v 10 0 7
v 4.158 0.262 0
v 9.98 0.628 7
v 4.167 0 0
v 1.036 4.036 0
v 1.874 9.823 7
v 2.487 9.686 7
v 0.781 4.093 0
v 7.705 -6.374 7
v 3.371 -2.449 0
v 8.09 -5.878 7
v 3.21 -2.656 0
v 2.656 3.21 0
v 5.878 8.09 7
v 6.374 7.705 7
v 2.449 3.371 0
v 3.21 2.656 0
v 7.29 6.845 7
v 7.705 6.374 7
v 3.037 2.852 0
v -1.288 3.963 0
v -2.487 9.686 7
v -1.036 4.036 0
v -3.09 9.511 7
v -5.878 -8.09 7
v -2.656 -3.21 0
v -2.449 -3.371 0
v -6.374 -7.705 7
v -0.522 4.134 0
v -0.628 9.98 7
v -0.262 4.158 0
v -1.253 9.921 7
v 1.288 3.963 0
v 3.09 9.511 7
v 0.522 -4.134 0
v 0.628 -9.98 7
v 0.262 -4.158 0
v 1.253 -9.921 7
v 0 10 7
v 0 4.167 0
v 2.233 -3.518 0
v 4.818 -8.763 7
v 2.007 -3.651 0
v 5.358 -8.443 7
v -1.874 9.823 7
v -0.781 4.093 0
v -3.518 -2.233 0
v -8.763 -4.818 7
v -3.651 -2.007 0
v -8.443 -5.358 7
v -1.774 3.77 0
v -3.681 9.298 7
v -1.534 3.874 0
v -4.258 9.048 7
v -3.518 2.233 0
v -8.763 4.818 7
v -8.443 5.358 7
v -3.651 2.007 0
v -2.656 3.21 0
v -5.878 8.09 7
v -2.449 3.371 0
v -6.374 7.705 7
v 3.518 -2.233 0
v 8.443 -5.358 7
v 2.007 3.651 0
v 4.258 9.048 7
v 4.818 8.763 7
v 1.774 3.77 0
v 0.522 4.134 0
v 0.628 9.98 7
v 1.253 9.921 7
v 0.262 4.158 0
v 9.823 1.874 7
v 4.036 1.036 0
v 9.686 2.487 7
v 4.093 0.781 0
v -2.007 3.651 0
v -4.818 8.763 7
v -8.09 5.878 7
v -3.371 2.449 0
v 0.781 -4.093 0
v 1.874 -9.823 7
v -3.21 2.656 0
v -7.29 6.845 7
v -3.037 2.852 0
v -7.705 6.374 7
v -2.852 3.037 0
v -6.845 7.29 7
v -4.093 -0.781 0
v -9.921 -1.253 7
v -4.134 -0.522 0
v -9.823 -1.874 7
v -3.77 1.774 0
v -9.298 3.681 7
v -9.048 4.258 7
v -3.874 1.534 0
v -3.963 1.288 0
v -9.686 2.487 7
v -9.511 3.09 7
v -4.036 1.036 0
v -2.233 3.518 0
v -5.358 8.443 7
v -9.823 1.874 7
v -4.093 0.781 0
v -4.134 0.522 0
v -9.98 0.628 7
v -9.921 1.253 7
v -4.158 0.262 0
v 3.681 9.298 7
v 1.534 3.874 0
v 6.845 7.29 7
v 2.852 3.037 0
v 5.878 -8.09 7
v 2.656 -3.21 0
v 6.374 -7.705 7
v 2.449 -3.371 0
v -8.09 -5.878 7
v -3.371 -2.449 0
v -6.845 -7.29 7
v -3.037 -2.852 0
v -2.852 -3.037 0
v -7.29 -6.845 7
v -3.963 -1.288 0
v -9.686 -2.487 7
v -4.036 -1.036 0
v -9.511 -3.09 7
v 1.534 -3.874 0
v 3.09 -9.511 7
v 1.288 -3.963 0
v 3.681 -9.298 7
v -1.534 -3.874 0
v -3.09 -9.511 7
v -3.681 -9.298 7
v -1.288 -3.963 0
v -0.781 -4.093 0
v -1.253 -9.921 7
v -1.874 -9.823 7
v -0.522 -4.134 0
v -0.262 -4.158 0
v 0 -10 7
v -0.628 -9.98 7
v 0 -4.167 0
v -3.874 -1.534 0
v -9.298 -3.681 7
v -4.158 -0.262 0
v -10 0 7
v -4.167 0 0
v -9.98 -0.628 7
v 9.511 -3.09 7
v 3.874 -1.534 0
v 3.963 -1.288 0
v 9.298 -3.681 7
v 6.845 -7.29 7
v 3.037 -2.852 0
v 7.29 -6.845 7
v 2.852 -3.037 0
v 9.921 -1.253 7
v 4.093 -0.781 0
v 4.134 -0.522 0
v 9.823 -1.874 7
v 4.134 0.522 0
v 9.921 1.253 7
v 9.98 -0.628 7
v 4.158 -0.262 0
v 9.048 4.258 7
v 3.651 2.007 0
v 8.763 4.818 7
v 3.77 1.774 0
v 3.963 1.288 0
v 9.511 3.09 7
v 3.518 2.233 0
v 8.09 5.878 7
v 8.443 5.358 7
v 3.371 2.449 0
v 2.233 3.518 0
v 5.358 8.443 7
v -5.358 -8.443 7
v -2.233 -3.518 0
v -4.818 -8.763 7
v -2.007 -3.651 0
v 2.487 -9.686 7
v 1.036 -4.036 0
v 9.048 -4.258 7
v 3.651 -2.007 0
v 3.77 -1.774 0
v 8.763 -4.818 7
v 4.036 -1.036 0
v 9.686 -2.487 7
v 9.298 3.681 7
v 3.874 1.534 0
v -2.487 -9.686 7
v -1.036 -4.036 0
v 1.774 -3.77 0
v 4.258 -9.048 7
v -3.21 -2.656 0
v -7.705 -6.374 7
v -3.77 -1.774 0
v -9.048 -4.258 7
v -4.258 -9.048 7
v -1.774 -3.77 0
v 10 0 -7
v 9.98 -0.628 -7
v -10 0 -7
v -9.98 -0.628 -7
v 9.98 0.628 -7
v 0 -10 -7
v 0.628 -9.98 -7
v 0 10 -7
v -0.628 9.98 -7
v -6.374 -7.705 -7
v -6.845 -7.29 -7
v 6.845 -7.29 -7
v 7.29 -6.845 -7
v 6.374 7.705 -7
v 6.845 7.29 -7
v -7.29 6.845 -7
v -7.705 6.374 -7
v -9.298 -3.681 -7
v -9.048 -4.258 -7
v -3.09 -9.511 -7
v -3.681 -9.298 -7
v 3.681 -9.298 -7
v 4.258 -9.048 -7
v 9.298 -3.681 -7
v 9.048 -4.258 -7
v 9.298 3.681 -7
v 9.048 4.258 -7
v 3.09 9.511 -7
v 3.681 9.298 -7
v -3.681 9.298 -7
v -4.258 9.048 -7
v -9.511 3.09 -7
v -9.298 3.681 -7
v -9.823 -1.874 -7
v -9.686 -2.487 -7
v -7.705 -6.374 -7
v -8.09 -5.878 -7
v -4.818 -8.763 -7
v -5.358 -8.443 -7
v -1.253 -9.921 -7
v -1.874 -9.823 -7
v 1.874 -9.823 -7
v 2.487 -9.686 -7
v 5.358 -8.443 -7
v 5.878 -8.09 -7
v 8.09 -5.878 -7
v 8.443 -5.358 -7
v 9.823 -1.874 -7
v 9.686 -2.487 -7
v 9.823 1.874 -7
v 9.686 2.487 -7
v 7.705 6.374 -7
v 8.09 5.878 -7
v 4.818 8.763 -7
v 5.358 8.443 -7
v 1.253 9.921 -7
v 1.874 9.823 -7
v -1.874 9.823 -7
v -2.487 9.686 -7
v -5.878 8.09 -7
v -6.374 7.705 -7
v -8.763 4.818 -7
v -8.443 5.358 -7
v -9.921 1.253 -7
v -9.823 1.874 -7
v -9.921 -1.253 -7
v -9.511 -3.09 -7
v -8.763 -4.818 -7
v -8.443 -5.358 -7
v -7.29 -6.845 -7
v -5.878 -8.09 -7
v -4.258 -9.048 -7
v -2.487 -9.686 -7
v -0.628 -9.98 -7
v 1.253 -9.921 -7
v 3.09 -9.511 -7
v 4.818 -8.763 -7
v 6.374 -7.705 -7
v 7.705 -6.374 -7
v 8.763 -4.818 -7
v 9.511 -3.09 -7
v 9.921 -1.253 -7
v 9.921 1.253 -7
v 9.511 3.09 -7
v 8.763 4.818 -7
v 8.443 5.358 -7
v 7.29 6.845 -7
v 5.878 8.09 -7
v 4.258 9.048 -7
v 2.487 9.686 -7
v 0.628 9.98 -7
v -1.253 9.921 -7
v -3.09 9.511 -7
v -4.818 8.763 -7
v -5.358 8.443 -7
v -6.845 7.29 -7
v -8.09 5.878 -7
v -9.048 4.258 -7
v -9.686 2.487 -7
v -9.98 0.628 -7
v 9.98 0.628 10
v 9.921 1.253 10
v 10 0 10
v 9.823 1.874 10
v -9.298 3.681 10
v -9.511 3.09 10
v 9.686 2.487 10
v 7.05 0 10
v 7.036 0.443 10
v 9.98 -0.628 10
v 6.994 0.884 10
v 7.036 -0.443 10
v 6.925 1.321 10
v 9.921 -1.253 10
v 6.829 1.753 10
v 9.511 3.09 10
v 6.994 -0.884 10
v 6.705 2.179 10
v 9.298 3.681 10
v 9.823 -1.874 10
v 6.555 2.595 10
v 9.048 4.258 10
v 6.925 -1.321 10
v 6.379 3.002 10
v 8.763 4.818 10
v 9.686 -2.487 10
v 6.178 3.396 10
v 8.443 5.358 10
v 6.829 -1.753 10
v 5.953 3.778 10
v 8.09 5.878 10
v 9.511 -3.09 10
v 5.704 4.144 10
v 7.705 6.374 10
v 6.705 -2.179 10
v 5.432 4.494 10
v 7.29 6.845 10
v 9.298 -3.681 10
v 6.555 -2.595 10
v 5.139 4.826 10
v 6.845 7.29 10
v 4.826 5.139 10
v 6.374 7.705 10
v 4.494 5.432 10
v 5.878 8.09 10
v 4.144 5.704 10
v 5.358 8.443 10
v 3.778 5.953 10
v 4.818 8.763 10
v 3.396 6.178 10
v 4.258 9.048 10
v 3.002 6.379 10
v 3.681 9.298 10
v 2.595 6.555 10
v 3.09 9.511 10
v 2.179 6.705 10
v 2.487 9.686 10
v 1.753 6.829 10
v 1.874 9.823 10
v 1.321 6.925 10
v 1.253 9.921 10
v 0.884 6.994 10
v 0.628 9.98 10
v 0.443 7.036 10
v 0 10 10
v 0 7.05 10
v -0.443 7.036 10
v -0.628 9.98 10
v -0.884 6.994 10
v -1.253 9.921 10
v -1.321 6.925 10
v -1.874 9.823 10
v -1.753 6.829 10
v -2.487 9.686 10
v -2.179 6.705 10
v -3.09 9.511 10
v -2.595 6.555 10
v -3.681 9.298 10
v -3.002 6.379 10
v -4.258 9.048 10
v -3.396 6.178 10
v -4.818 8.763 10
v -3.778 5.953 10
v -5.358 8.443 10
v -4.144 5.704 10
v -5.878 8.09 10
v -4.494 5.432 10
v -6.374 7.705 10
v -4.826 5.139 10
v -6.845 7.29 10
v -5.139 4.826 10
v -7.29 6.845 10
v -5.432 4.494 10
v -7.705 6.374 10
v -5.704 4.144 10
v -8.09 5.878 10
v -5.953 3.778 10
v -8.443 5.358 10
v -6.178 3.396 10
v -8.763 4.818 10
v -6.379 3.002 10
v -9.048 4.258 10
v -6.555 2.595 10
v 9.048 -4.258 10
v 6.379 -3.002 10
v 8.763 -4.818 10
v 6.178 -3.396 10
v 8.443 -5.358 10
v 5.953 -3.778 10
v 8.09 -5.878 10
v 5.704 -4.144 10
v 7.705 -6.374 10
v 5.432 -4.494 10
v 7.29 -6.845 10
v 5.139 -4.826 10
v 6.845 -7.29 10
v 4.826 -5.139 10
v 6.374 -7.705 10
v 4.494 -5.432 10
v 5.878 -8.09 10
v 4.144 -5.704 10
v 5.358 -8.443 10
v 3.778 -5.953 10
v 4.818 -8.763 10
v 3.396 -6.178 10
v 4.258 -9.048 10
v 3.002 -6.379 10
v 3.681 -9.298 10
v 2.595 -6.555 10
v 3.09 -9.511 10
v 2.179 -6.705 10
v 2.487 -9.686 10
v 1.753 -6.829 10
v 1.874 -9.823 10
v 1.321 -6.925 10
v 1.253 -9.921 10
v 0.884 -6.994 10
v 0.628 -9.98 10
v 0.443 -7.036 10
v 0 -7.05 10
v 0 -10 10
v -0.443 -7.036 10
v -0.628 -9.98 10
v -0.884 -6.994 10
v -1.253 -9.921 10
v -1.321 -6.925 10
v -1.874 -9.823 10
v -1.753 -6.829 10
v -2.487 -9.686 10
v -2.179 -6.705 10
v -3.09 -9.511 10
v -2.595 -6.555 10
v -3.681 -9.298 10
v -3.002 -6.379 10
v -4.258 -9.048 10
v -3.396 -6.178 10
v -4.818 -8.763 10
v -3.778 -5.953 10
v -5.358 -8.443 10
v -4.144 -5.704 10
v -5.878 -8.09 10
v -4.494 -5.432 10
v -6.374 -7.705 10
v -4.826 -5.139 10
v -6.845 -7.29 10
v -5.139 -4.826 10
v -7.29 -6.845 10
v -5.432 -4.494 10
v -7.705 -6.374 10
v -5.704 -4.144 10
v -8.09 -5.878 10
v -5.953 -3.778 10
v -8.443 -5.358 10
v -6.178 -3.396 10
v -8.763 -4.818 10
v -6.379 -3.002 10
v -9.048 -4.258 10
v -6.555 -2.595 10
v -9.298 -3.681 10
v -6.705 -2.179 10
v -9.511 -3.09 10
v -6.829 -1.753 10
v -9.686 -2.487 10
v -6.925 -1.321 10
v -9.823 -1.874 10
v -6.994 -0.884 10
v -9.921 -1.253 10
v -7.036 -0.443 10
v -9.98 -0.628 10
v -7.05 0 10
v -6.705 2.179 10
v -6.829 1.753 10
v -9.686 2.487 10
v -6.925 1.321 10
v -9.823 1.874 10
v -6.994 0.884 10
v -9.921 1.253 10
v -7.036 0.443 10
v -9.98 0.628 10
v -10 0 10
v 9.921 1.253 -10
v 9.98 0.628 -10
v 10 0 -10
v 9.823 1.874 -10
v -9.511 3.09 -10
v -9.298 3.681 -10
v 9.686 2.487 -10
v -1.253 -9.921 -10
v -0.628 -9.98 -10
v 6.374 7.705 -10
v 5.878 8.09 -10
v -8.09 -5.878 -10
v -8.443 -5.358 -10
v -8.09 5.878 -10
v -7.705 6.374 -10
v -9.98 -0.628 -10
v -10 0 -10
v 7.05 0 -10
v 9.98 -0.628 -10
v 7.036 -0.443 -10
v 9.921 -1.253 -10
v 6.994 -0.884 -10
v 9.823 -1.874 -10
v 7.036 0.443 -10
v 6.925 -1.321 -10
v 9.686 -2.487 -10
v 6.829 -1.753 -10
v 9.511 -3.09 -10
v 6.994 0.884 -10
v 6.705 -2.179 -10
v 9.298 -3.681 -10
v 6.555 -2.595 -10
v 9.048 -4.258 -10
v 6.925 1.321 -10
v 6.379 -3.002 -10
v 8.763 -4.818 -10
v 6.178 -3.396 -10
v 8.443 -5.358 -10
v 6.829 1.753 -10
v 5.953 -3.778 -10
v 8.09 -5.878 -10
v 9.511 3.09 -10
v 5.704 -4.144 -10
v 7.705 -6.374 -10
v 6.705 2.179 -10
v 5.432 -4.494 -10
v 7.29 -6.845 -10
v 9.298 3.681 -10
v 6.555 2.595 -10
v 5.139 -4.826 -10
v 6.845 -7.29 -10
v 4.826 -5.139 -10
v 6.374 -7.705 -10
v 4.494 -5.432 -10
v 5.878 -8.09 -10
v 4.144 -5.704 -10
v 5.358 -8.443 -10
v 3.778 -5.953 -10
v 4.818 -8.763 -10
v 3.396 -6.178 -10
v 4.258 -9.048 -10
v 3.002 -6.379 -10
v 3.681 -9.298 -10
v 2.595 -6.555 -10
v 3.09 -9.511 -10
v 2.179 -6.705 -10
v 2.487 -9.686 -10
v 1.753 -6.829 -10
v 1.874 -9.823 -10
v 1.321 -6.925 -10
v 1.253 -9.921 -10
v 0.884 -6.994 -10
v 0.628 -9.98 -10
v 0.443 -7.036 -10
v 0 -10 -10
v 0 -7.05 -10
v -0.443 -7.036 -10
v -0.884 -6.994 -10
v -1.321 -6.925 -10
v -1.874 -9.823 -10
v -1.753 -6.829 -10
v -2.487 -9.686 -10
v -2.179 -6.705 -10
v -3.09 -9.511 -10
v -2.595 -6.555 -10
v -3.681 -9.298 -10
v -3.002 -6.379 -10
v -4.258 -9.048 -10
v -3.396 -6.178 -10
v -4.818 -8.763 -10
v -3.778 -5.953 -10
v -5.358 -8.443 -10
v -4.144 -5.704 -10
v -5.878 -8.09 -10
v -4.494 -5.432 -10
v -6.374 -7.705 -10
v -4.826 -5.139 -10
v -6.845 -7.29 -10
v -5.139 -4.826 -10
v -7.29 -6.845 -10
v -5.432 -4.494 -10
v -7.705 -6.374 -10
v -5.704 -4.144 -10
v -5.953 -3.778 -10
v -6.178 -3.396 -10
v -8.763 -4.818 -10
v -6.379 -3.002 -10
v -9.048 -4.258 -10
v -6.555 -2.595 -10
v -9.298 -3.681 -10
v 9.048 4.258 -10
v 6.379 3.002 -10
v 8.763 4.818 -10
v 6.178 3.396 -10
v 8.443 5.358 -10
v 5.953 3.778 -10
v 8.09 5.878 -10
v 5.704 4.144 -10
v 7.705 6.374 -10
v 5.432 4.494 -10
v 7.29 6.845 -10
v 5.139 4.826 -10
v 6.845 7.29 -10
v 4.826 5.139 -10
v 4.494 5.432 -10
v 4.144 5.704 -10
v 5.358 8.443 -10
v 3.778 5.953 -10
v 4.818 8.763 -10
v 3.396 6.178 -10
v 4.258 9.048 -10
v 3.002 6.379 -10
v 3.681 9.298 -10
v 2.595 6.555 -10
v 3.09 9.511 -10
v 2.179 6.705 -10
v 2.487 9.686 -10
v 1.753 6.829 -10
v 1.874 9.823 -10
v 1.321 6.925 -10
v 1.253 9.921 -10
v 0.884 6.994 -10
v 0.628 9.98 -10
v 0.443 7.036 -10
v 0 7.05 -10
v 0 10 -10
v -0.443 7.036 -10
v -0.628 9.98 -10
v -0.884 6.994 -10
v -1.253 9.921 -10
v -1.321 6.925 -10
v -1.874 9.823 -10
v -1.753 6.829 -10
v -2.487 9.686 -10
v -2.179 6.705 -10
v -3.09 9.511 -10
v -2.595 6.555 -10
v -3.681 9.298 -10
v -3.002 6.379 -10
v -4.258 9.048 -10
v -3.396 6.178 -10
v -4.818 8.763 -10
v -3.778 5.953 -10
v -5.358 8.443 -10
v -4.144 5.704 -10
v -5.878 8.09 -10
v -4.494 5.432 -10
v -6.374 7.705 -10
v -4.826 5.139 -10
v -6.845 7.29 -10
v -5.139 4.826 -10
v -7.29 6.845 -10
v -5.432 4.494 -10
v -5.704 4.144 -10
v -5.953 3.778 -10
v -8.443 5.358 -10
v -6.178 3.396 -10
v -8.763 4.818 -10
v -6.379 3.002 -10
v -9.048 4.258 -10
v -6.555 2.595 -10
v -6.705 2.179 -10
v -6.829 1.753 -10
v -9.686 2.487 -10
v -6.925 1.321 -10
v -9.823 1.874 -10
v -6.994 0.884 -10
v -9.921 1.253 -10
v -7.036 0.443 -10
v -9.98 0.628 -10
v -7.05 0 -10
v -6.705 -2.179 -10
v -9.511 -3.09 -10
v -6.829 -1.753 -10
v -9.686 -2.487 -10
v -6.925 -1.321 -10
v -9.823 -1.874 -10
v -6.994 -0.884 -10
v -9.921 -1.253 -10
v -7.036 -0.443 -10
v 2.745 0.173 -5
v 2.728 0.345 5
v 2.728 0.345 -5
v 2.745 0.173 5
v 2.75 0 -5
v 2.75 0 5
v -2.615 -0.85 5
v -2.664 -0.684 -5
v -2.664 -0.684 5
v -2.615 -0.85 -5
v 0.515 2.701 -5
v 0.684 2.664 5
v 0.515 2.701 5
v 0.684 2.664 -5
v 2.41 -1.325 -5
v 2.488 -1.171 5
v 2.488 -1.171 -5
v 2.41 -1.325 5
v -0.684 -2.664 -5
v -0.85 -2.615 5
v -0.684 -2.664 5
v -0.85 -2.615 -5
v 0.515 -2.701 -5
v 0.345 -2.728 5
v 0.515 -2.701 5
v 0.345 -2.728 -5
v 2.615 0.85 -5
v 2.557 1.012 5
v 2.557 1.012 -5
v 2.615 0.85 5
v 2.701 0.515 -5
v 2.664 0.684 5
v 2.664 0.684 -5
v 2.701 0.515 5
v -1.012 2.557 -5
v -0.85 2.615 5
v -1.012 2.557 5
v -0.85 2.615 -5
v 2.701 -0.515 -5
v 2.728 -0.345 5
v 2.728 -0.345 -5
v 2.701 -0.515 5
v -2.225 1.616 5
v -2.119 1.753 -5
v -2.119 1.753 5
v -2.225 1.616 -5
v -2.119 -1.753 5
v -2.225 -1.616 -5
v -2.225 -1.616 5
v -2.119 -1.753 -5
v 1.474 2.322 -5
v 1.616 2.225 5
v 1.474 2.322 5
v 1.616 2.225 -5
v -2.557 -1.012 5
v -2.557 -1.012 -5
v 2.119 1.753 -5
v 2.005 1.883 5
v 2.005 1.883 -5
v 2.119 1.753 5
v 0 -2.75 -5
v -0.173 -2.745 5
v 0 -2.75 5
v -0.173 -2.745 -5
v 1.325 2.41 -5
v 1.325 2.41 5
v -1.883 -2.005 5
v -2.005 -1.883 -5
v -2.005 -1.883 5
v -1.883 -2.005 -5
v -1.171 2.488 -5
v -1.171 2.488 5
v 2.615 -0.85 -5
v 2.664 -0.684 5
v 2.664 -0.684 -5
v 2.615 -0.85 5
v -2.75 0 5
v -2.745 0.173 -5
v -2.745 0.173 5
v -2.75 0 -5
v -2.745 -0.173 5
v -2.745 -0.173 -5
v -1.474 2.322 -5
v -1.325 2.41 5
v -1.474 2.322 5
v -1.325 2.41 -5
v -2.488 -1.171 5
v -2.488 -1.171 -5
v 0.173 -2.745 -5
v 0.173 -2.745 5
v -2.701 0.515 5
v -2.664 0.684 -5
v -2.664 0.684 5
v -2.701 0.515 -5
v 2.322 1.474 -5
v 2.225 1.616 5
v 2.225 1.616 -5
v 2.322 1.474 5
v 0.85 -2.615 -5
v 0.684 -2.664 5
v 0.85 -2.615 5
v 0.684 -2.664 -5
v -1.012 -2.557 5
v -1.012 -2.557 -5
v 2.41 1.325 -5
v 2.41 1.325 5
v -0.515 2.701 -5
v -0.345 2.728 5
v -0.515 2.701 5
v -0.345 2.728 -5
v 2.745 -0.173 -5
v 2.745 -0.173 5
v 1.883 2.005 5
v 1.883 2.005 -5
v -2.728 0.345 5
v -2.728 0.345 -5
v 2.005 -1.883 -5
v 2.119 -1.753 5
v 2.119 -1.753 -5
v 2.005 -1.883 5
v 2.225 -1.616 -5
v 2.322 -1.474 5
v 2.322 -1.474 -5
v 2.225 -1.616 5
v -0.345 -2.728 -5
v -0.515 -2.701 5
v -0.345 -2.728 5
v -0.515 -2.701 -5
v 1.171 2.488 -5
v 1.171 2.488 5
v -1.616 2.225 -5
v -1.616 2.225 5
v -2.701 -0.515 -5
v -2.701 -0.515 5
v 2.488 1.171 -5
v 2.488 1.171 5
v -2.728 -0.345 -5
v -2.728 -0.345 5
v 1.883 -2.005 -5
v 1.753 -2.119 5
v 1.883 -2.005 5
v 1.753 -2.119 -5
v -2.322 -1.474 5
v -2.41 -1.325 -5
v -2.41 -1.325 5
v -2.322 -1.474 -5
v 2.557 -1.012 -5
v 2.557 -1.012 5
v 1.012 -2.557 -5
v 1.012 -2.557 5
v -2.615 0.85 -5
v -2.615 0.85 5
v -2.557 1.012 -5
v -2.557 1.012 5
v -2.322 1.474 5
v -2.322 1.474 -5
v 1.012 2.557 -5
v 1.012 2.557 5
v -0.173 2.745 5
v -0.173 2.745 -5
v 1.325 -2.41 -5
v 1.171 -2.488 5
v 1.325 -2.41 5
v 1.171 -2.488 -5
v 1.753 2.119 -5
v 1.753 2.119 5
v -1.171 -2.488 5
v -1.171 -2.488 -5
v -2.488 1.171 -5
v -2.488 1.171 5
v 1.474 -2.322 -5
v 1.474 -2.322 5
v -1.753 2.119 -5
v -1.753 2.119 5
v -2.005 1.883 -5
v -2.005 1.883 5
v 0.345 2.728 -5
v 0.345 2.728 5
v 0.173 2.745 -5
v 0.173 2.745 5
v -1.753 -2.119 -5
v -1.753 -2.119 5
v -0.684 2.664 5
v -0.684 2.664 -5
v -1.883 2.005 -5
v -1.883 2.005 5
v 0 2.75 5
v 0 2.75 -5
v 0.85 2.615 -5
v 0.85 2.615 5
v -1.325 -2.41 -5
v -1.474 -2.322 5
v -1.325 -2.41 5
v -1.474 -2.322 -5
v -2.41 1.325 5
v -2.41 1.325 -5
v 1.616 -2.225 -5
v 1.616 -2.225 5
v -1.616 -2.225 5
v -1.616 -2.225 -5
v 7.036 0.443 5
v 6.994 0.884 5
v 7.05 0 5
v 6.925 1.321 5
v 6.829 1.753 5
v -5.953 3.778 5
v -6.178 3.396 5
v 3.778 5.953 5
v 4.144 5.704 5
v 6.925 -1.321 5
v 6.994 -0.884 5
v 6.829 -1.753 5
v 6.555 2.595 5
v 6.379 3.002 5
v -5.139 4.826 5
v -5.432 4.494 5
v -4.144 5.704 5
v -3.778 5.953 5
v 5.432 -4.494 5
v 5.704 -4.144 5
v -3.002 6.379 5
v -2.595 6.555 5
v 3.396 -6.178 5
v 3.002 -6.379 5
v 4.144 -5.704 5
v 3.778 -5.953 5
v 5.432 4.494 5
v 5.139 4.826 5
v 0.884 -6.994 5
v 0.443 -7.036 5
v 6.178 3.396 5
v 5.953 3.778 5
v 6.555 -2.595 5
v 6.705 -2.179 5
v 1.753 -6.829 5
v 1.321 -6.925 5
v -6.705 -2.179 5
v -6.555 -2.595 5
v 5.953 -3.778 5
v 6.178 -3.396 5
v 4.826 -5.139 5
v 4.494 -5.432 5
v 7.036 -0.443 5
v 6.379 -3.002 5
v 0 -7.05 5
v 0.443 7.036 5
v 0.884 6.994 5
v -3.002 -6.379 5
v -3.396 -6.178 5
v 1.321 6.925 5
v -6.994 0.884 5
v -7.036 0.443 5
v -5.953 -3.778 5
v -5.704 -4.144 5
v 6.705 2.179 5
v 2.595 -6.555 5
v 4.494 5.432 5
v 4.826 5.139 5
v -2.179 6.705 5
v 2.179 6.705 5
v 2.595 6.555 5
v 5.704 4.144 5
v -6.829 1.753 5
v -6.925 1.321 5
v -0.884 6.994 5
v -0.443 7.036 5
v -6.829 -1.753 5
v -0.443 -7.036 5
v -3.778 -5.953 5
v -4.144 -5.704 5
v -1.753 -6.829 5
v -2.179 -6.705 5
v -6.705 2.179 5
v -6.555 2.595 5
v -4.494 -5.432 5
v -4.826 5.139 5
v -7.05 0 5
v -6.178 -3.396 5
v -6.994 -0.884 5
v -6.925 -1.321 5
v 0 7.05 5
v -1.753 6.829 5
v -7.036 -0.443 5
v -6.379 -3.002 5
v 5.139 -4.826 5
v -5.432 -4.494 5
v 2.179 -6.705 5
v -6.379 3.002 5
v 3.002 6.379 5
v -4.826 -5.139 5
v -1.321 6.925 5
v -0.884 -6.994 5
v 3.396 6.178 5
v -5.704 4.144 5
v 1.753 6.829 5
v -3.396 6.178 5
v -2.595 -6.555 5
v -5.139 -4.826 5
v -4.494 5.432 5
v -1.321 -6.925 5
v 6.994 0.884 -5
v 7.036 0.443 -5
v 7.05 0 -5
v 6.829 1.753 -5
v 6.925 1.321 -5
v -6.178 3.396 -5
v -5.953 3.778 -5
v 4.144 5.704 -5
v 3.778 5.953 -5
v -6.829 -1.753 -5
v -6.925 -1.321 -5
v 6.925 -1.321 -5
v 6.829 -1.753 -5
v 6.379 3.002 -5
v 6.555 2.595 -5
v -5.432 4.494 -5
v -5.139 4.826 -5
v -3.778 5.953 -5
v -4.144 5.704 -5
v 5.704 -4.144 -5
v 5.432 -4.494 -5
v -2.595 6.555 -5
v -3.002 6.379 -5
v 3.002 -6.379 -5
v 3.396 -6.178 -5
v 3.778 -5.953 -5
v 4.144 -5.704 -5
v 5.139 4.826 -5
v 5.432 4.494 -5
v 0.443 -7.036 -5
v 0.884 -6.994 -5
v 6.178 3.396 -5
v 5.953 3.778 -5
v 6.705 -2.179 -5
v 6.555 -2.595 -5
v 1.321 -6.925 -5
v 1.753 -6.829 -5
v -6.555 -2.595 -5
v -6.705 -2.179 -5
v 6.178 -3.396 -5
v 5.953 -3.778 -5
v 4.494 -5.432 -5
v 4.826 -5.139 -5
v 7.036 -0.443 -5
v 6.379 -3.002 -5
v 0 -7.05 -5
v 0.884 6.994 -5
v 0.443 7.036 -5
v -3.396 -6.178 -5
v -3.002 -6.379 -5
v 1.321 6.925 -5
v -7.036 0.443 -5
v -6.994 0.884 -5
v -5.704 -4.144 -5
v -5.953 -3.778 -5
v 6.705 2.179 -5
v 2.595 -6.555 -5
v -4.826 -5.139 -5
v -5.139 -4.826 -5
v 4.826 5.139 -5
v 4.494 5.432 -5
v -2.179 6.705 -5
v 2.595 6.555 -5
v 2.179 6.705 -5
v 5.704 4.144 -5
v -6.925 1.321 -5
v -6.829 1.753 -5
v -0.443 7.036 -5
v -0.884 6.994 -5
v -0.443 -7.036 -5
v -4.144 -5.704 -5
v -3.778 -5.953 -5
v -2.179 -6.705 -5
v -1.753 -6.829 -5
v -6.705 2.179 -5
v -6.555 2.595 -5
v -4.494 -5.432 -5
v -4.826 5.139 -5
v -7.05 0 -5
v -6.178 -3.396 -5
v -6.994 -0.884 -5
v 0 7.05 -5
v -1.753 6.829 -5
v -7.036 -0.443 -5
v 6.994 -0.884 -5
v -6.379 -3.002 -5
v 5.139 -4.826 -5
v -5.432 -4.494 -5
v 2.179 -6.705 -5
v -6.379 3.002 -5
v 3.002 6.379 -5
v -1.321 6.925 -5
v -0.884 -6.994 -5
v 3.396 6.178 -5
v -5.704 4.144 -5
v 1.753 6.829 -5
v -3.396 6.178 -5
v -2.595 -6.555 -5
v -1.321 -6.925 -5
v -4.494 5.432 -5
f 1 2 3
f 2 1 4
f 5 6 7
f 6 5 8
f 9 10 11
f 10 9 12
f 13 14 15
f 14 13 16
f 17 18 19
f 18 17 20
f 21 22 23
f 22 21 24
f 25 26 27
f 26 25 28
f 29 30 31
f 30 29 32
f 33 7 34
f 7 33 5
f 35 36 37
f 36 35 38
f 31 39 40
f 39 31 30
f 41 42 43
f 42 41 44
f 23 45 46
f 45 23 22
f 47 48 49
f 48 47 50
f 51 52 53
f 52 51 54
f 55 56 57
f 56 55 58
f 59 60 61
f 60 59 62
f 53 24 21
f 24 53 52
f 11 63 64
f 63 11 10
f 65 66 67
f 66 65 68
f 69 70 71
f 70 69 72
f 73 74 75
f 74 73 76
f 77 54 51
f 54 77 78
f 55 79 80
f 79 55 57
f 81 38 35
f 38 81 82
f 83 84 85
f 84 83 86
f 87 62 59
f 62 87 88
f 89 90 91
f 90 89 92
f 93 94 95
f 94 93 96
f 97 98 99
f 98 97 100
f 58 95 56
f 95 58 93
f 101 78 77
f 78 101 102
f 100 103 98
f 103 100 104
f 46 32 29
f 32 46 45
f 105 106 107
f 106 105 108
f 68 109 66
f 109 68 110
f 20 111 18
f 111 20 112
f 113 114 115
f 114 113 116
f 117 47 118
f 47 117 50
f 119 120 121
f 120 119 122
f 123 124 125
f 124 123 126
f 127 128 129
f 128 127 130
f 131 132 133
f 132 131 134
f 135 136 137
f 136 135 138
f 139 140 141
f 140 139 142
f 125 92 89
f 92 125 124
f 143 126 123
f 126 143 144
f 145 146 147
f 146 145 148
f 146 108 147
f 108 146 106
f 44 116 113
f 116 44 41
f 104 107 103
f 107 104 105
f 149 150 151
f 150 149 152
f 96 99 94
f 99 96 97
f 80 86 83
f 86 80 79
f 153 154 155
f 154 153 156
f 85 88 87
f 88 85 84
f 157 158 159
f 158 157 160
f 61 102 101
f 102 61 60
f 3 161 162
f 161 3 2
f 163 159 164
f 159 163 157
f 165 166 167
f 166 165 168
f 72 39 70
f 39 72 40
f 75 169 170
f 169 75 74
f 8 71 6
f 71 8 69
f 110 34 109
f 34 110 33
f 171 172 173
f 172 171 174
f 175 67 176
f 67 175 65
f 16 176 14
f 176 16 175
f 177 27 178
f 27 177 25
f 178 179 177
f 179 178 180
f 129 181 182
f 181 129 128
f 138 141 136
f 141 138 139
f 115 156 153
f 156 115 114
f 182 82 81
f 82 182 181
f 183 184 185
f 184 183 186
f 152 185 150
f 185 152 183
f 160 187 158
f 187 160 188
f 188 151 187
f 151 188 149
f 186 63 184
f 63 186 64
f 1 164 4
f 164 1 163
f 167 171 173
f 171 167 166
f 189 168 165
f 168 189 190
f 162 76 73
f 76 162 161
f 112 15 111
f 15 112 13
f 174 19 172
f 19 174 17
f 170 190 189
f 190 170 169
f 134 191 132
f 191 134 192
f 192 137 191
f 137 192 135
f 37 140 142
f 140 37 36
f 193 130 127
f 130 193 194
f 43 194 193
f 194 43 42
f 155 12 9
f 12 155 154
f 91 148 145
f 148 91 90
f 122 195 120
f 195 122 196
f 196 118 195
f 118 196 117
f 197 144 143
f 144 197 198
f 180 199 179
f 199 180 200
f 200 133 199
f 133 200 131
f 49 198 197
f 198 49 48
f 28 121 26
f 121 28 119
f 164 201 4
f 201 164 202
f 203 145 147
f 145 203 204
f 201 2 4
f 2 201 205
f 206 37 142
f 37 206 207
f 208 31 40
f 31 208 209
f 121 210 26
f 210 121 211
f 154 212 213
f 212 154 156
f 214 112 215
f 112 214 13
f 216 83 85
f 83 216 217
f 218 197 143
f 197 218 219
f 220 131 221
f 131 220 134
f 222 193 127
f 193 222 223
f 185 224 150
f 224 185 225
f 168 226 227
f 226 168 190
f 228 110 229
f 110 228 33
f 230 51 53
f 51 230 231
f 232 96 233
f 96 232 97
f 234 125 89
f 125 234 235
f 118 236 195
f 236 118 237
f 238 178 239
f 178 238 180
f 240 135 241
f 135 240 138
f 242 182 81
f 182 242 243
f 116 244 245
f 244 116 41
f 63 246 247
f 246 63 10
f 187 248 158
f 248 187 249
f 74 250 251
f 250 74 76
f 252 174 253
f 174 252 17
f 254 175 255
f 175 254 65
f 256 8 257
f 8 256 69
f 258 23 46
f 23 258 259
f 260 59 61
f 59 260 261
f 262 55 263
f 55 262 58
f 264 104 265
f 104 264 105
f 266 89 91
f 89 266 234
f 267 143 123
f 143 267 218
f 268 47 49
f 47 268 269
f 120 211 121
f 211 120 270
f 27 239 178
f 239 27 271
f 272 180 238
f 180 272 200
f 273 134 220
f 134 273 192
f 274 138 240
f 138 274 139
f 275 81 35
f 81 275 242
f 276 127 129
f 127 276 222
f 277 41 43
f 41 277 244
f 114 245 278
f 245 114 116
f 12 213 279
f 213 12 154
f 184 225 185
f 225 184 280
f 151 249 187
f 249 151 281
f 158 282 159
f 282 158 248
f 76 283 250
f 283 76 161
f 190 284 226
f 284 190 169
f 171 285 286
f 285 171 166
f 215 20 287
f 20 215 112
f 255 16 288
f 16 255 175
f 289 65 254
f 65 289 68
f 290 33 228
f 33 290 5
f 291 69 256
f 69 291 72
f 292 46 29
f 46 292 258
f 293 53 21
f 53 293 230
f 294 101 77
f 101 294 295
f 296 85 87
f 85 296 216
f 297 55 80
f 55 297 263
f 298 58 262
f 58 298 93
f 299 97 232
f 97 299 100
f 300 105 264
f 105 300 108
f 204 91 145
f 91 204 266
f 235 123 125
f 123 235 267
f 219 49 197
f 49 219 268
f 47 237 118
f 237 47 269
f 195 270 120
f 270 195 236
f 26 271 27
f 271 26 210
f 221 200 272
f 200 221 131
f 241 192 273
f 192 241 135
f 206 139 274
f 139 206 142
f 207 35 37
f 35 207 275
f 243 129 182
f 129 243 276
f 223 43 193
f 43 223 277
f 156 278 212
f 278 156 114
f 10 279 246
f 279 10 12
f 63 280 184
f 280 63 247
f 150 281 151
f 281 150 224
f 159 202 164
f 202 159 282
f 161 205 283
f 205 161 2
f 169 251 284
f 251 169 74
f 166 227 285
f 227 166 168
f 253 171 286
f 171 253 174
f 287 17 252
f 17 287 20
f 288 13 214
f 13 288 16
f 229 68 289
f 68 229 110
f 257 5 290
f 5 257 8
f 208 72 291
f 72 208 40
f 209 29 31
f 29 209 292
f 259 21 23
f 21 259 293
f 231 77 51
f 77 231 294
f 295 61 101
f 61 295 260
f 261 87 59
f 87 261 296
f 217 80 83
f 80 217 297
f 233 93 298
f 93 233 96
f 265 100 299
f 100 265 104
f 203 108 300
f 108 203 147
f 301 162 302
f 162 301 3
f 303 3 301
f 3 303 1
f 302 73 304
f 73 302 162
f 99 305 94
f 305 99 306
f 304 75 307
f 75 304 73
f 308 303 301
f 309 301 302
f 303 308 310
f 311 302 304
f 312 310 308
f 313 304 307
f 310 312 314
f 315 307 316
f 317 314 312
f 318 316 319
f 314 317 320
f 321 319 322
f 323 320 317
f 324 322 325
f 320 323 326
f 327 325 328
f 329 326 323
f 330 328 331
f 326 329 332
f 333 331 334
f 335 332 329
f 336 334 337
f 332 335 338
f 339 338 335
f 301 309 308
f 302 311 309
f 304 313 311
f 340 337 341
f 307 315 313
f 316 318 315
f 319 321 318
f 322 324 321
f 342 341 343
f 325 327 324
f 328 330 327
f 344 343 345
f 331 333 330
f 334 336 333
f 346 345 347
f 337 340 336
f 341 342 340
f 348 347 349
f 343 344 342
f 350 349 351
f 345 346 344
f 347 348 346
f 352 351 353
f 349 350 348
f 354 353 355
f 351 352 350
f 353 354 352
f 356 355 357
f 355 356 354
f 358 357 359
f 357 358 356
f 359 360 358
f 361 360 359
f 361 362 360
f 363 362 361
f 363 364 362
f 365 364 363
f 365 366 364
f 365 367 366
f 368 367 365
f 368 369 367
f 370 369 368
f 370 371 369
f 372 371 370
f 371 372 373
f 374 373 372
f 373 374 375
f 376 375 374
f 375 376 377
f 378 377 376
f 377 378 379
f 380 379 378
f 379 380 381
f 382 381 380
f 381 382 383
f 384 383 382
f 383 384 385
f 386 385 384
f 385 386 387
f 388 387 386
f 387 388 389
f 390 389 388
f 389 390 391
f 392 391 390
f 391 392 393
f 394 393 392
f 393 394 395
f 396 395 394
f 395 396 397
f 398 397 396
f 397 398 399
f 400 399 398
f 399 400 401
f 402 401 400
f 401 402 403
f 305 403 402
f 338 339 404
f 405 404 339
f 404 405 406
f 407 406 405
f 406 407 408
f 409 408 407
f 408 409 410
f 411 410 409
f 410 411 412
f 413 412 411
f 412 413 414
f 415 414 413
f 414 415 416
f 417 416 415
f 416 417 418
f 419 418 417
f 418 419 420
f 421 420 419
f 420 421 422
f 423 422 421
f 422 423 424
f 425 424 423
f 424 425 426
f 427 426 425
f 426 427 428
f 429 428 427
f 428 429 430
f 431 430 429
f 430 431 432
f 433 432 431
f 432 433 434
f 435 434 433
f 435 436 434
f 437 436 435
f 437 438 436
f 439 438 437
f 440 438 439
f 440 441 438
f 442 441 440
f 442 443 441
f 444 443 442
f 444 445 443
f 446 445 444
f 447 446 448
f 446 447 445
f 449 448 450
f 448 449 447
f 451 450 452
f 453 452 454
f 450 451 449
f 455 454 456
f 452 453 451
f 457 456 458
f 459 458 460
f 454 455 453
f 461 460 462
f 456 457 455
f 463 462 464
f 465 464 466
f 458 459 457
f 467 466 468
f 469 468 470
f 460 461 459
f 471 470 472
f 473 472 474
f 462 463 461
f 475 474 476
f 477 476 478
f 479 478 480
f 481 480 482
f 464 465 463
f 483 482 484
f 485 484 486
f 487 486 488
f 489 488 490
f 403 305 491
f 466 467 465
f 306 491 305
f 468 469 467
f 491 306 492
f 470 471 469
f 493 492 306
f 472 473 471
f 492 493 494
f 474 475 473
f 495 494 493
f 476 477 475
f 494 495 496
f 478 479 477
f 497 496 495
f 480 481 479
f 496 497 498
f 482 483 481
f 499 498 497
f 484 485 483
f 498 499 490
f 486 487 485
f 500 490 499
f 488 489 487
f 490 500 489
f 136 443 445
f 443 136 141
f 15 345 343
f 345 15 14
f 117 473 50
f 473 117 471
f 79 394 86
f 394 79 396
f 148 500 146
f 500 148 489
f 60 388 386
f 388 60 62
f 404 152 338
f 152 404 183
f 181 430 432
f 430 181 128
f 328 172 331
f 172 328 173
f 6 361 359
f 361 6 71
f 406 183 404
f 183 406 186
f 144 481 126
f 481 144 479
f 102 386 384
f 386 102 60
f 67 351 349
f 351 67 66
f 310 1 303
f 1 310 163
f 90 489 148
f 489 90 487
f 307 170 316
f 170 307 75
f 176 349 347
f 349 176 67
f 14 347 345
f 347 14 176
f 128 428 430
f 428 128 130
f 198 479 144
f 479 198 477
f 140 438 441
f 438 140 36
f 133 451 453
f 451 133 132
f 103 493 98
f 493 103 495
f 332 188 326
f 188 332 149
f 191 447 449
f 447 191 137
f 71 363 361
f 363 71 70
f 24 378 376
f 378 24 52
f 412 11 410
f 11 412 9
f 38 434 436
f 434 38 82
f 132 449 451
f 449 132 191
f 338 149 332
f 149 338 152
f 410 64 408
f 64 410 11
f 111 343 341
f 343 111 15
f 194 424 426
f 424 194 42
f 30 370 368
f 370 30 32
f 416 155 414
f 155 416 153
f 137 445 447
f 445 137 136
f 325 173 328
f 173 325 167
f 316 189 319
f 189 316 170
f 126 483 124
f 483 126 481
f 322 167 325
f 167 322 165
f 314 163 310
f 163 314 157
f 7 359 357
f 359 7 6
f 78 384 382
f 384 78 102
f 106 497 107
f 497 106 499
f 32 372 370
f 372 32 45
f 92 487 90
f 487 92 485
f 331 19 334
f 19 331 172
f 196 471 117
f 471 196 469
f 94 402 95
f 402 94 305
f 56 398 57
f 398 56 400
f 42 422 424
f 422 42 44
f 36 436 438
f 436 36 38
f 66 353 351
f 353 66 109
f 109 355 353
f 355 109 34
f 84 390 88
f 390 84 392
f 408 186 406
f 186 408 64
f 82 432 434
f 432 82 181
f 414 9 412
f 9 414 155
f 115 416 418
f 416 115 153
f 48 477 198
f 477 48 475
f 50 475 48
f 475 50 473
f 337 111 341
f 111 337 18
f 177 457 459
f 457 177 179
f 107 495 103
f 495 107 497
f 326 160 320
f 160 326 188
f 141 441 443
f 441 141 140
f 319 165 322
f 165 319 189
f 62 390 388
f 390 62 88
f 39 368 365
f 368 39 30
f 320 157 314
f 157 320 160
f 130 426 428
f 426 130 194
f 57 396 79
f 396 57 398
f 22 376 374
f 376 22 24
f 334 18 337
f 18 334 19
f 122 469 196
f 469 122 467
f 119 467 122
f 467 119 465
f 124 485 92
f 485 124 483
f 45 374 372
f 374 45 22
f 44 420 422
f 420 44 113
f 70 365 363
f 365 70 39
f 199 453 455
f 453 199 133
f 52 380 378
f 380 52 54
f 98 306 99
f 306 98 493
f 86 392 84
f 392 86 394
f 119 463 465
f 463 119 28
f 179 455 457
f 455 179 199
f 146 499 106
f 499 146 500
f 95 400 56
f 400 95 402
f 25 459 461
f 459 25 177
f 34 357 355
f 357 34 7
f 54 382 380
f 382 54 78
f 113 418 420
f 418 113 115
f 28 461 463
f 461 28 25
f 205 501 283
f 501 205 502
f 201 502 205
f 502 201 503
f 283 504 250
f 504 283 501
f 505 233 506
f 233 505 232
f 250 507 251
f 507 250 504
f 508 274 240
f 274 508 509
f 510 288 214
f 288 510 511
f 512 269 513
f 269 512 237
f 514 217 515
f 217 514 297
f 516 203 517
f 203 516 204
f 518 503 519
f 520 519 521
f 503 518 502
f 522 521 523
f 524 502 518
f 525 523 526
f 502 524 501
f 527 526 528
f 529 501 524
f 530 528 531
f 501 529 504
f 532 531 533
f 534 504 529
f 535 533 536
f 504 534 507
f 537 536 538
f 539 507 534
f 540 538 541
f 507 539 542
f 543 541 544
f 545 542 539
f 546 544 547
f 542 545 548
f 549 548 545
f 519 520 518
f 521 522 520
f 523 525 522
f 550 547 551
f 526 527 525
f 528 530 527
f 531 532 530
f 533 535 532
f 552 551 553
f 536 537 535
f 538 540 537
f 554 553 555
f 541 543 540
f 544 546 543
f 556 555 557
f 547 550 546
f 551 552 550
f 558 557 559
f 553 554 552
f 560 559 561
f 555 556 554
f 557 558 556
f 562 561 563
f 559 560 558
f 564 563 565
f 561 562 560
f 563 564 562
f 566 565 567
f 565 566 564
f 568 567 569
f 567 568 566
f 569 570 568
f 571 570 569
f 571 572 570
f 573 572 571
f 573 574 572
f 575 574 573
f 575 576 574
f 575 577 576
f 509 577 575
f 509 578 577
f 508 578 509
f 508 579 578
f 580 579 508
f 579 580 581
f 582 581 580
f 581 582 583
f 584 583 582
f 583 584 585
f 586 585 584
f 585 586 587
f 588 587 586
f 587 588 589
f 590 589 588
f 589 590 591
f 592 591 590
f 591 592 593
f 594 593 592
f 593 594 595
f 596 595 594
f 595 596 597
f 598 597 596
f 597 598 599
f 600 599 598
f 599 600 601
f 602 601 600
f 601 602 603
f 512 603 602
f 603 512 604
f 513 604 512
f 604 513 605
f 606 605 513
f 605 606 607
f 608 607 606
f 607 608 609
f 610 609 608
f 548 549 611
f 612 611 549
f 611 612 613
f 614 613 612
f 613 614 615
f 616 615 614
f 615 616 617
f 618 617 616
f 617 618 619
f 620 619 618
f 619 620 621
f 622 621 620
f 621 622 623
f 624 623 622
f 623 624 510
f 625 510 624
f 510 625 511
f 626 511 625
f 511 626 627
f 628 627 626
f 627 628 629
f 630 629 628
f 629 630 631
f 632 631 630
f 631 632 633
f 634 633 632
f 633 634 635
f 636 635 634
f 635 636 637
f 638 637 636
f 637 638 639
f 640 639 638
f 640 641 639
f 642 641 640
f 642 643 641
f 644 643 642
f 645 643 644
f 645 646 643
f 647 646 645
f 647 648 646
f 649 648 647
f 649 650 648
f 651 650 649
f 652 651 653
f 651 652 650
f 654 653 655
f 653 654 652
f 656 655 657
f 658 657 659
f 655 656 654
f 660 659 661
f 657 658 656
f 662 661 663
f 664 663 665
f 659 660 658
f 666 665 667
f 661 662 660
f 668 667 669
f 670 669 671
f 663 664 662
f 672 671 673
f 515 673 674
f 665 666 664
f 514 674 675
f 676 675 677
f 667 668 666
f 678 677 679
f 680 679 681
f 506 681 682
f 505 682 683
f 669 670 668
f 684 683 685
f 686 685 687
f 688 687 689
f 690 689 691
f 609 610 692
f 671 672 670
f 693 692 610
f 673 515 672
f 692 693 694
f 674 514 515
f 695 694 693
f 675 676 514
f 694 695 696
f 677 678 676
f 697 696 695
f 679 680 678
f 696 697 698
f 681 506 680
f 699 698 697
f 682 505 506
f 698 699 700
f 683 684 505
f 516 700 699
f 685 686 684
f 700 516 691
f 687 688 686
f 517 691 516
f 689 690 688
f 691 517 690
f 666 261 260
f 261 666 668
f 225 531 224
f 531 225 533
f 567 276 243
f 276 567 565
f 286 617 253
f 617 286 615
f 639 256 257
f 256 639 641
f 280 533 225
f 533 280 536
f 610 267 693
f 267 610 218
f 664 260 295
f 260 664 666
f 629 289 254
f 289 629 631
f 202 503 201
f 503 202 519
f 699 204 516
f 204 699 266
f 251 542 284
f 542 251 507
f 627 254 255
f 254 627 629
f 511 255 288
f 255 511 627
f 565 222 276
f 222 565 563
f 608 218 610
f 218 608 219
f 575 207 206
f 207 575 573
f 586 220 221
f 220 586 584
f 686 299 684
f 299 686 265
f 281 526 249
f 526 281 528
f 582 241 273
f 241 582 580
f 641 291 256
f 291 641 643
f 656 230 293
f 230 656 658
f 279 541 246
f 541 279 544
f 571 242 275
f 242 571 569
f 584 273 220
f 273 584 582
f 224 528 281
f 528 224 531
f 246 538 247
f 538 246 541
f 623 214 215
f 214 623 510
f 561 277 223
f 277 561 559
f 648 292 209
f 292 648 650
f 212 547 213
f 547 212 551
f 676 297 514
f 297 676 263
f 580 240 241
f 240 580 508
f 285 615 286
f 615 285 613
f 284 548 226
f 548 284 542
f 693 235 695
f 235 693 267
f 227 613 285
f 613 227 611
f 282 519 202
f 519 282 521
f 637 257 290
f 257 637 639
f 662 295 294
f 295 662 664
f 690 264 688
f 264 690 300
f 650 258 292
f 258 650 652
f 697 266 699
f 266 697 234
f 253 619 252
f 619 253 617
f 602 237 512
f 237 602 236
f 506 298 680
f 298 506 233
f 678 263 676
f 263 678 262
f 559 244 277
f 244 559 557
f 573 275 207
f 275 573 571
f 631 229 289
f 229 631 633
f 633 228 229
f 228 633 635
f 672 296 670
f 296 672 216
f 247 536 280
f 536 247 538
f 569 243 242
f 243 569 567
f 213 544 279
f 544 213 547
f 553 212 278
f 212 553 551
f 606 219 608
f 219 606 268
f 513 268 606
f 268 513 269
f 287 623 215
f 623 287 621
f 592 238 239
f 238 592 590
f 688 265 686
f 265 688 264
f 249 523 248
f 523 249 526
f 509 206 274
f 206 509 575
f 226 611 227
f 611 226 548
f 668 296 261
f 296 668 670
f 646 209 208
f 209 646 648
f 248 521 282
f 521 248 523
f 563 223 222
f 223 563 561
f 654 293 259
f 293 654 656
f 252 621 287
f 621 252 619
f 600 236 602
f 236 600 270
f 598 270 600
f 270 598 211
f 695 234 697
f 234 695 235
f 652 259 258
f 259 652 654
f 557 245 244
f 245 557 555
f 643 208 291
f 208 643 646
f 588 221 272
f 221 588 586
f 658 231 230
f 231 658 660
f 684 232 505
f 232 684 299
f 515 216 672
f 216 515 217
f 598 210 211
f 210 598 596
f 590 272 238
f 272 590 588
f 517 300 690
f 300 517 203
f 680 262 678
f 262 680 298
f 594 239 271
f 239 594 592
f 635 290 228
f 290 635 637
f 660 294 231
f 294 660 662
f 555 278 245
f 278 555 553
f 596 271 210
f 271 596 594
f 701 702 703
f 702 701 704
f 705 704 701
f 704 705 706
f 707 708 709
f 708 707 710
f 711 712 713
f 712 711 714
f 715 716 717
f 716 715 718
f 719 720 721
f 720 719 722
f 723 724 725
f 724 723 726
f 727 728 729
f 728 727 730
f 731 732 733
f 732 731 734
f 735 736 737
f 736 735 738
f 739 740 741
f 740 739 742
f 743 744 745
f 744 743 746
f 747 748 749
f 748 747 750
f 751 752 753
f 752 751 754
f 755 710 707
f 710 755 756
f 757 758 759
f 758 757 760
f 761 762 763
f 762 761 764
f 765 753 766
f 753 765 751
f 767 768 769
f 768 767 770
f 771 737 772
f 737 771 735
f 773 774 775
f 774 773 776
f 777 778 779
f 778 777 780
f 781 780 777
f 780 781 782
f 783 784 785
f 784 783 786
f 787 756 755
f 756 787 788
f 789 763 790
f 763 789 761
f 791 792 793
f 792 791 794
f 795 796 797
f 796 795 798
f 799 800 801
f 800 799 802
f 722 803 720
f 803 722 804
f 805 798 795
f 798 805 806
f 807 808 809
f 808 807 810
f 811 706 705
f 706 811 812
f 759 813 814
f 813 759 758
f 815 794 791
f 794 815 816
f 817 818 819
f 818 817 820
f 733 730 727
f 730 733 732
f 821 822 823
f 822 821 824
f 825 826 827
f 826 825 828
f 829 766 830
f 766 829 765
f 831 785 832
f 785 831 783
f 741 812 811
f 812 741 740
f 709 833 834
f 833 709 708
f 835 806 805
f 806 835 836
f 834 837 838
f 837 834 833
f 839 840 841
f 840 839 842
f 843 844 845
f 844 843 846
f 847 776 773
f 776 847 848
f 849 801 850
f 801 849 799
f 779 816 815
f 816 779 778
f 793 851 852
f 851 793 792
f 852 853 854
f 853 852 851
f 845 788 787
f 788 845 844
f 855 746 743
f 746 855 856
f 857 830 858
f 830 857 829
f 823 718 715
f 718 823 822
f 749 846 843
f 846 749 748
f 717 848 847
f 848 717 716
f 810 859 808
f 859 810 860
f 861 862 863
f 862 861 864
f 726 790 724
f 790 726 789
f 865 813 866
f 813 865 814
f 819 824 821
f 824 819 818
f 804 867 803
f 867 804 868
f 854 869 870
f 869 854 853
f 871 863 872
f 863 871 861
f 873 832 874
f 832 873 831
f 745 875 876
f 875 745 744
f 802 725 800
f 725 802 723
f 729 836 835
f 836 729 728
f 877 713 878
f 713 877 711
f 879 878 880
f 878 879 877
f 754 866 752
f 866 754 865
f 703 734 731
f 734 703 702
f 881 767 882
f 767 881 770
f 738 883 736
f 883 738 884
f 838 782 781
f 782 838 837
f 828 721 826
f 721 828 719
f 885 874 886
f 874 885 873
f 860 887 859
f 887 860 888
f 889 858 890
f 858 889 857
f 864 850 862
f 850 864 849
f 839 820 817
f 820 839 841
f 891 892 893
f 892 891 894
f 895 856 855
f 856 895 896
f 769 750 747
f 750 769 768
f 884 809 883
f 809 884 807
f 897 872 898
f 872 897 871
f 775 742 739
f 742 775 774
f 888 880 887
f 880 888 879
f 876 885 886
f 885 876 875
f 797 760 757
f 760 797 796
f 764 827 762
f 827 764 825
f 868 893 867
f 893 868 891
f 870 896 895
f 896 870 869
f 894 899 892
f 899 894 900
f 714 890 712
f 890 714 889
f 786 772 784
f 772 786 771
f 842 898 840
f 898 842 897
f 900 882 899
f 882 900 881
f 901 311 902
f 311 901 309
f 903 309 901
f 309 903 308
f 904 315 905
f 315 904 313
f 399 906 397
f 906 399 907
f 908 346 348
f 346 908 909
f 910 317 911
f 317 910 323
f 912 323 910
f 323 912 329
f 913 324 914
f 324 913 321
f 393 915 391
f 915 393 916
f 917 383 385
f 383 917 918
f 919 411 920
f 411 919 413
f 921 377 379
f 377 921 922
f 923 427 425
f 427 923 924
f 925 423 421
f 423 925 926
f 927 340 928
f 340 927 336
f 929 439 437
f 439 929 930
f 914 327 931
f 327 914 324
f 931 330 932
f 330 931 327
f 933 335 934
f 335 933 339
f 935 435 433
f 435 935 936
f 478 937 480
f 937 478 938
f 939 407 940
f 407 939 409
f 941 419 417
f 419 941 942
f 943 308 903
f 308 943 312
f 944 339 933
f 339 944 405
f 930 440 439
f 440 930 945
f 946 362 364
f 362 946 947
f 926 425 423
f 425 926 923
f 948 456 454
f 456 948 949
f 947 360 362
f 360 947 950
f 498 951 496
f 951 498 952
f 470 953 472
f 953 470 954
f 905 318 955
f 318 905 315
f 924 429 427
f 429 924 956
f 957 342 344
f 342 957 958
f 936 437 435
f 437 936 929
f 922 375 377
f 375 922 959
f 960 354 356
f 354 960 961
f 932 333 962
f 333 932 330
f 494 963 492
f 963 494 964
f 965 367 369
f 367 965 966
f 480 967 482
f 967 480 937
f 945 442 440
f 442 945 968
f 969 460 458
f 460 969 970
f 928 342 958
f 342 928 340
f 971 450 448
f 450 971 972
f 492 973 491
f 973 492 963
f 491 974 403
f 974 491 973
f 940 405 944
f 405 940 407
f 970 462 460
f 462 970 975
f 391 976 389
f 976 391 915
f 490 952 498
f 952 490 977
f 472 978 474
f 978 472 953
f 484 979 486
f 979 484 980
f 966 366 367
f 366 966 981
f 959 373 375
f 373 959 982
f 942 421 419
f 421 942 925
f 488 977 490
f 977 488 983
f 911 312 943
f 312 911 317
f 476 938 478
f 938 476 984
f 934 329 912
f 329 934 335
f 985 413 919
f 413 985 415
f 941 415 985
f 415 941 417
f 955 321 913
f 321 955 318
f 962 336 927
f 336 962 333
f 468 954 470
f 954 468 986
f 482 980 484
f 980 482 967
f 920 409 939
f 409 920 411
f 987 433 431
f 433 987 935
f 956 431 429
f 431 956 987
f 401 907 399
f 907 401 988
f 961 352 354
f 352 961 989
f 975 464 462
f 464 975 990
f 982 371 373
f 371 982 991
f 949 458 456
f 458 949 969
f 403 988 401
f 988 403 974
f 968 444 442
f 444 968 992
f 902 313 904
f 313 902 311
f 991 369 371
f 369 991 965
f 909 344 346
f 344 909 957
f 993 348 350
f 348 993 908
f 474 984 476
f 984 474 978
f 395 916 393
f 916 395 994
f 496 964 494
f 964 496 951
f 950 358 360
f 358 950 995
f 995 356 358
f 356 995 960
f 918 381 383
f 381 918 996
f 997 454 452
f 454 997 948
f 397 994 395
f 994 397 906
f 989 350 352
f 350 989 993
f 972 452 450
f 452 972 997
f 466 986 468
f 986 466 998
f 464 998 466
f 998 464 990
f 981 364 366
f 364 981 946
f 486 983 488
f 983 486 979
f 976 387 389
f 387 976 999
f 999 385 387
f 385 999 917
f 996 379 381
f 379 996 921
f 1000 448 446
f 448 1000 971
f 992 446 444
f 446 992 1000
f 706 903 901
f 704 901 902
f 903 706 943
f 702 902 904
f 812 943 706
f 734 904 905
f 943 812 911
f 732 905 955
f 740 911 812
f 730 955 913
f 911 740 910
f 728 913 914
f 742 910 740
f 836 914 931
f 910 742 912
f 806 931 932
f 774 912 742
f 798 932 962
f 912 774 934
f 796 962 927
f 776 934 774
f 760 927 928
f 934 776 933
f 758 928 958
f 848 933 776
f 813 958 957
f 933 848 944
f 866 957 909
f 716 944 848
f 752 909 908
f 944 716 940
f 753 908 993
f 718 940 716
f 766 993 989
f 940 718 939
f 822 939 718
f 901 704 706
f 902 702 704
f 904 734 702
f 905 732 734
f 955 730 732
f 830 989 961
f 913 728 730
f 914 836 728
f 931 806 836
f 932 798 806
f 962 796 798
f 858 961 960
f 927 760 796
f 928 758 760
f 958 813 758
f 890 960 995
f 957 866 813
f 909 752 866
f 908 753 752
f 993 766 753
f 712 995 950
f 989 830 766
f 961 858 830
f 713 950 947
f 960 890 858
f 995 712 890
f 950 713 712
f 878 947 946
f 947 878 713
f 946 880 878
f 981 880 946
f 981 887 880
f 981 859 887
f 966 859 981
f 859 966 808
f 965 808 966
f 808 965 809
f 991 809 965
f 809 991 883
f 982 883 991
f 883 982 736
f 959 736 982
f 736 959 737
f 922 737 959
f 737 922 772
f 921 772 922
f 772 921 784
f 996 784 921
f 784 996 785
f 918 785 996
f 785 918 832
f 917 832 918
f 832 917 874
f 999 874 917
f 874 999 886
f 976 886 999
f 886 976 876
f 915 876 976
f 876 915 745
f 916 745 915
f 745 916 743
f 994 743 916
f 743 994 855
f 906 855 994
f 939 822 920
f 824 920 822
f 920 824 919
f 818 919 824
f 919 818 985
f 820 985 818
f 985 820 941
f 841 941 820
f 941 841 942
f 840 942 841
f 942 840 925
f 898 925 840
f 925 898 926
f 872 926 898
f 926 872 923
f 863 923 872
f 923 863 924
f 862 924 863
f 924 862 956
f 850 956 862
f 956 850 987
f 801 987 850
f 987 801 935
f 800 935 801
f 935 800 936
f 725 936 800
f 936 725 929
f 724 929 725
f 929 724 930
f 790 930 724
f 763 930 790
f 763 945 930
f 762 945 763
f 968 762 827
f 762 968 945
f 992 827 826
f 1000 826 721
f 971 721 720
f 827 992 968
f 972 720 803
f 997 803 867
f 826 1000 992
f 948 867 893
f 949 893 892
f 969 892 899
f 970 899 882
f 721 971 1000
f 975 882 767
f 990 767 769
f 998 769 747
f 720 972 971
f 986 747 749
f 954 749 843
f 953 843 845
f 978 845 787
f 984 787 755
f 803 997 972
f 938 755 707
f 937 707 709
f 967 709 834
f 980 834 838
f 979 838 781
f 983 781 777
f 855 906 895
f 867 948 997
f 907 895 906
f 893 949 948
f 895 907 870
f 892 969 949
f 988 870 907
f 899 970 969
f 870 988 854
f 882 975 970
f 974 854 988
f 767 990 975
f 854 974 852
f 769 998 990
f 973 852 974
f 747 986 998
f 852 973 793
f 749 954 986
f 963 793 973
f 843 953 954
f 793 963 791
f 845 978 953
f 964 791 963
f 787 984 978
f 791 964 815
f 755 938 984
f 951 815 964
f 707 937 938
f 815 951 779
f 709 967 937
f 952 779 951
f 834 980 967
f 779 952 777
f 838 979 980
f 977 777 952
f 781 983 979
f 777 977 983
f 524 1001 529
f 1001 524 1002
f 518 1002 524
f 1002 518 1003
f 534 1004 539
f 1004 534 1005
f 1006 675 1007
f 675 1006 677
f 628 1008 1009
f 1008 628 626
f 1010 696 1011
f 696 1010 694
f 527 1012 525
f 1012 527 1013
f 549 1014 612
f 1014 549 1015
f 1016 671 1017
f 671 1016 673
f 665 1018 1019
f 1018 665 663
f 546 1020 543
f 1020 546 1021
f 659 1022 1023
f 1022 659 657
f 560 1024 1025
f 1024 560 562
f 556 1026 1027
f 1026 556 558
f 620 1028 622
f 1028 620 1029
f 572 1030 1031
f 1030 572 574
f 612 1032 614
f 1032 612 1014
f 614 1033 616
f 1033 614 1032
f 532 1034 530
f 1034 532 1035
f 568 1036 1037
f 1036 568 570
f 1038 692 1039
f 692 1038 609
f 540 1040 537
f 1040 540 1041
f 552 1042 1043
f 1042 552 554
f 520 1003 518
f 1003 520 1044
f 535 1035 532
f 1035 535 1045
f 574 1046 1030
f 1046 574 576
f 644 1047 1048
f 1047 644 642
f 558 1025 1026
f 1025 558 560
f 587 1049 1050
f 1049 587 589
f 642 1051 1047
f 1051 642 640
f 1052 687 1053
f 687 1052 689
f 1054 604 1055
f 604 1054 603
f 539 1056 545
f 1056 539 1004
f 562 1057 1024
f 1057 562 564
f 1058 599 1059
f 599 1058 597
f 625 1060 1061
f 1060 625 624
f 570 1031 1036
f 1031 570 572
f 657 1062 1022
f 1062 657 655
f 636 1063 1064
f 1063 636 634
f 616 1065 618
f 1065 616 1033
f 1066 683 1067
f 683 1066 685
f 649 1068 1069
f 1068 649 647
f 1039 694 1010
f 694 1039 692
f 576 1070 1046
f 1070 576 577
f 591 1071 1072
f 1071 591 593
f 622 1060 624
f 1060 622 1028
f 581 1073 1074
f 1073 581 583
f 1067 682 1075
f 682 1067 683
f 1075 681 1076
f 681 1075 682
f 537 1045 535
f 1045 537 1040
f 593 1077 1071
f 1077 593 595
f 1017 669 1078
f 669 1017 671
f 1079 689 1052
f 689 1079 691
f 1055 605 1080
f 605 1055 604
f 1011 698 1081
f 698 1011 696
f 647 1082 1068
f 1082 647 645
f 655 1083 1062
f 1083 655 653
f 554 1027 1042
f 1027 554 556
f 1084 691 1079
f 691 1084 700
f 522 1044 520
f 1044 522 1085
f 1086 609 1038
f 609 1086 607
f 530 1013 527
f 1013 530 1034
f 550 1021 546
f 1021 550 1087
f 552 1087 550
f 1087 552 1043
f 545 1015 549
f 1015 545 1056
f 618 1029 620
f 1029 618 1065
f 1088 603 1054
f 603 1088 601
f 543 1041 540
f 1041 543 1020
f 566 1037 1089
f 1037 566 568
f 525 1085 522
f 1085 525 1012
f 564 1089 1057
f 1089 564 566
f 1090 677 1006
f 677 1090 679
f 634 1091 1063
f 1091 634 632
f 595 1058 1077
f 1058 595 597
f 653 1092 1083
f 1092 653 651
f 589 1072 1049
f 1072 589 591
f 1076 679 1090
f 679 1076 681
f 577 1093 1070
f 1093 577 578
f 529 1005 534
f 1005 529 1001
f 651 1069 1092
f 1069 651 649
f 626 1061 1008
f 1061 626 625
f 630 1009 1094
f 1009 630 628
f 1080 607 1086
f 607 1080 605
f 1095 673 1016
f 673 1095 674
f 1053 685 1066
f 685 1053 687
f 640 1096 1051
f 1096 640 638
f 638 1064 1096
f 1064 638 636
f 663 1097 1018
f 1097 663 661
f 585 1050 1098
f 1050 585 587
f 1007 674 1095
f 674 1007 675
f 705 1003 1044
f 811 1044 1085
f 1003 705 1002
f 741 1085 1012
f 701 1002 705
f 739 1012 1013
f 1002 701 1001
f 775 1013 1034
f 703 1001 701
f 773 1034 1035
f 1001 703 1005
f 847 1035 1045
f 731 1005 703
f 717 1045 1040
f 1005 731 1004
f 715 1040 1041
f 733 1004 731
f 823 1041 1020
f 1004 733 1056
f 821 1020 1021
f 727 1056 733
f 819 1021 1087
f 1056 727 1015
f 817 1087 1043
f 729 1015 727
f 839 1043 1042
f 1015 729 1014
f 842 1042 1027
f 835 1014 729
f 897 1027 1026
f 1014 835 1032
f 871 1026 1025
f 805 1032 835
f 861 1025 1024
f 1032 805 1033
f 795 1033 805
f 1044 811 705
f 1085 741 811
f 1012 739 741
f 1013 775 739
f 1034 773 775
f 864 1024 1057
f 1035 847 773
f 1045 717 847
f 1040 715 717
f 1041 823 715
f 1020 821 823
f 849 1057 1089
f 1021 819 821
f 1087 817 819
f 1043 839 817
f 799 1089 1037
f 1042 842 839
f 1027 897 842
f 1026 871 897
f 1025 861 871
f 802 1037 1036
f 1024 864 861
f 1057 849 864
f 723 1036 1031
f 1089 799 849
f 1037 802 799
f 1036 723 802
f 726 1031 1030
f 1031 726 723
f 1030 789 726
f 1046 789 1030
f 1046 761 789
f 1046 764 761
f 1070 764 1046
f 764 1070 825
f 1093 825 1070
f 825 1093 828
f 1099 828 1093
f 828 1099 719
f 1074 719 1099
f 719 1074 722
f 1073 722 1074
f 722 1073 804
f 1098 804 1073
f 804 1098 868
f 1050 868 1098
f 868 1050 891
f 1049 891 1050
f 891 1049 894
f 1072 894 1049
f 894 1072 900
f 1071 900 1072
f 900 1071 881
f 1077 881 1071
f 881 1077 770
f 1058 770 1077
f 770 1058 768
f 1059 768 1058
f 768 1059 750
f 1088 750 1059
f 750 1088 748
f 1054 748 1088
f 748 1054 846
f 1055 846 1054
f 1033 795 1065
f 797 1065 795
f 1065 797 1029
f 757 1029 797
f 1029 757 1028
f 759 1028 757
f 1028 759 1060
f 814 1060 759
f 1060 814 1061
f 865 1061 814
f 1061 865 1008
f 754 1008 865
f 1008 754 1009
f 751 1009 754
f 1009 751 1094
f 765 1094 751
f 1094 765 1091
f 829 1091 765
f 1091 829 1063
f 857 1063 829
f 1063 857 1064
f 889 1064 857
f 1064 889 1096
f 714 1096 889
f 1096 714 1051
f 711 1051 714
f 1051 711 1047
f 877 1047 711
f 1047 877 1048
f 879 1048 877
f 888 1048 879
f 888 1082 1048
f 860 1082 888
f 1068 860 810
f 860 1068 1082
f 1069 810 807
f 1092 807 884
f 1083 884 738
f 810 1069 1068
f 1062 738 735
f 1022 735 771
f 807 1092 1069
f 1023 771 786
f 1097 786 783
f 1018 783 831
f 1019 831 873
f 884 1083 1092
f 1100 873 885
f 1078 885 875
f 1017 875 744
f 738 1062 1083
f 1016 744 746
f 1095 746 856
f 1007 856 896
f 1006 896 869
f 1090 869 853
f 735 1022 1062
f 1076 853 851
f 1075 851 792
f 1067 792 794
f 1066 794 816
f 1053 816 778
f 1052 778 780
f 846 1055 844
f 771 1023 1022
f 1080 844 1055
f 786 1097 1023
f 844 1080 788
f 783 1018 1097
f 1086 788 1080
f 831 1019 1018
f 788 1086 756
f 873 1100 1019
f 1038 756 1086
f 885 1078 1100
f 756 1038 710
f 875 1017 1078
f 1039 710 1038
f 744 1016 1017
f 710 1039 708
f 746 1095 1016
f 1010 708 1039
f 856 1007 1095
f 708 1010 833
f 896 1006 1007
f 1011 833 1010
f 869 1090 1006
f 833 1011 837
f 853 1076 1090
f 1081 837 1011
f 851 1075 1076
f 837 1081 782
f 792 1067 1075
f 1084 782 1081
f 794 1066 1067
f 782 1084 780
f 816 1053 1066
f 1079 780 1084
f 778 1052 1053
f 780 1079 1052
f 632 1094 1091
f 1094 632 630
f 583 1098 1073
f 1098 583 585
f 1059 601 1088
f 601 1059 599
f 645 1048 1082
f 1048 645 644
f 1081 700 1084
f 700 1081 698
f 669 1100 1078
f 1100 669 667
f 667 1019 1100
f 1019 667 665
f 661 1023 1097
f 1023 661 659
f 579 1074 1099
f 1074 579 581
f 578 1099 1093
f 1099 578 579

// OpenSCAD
$fn=100;

d=20;
h=12;

difference(){
union(){
	translate([0,0,1])cylinder(d1=0,d2=d,h=h,center=true);
	translate([0,0,-1])rotate([180,0,0])cylinder(d1=0,d2=d,h=h,center=true);

	translate([0,0,8.5])cylinder(d=d,h=3,center=true);
	translate([0,0,-8.5])cylinder(d=d,h=3,center=true);
}

cylinder(d=5.5,h=d,center=true);

translate([0,0,9])cylinder(d=14.1,h=8,center=true);
translate([0,0,-9])cylinder(d=14.1,h=8,center=true);

}
